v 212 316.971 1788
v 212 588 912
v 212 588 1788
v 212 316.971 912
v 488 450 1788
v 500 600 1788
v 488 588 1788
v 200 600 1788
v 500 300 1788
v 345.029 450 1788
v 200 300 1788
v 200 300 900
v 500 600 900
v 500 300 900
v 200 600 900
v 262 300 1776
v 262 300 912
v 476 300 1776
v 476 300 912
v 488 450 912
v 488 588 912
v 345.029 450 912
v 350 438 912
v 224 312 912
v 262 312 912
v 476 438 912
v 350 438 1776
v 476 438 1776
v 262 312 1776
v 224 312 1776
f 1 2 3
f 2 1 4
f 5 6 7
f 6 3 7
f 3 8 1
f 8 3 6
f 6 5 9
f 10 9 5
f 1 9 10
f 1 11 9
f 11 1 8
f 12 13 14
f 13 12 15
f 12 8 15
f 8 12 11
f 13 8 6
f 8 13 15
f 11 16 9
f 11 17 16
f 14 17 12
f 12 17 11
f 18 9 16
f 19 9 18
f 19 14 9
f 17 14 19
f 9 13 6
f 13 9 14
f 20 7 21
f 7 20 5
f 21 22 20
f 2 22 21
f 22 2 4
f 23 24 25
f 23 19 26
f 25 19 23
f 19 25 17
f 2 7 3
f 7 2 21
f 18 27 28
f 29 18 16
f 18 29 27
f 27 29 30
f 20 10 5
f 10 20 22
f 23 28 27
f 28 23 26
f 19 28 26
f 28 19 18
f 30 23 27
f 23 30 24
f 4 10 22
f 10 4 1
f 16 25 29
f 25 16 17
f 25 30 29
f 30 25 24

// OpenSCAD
// file: door.scad
/*

    Door
    
    By Anton Augustsson


*/

// use dovtail library

module door (
    thicknessBottom,
    thicknessSide,
    thicknessFront,
    lenghtDoor,
    widthDoor,
    heightDoor,
    xDoor,yDoor,zDoor,
    yRotate
    ){
/*
    ---------- Local varibles ---------- 
*/

length = lenghtDoor;
width  = widthDoor;
height = heightDoor;

widthHandal = 50;
        
x=xDoor;
y=yDoor;
z=zDoor;

/*
    ---------- Code ---------- 
*/

//rotate([0,0,0])  0,0,0
//rotate([0,180,0])  0,0,height
translate([
    x,
    y,
    z]) 
rotate([0,yRotate,0])
difference () {
union () {


// Bottom 
color("Wheat")
translate([
    0,
    0,
    0]) 
cube(size = [
    width,
    length,
    thicknessBottom]);


// top
color("Wheat")
translate([
    0,
    0,
    height-thicknessBottom]) 
cube(size = [
    width,
    length,
    thicknessBottom]);


// Back
color("BurlyWood")
translate([
    0,
    length-thicknessSide,
    0]) 
cube(size = [
    width,
    thicknessSide,
    height]);    


// Side not angle
color("Wheat")
translate([
    0,
    0,
    thicknessBottom]) 
cube(size = [
    thicknessSide,
    length,
    height-thicknessBottom*2]); //

// Side angle
color("Wheat")
translate([
    width,
    0,
    thicknessBottom]) 
rotate([0,0,45])
cube(size = [
    thicknessSide,
    sqrt(length*length*2),
    height-thicknessBottom*2]); //

// Back
color("BurlyWood")
translate([
    width-widthHandal,
    0,
    0]) 
cube(size = [
    widthHandal,
    thicknessSide,
    height]);    

}

// removal
union () {
translate([
    width+sqrt(thicknessSide*thicknessSide*2),
    0,
    -1]) 
rotate([0,0,45])
cube(size = [
    length*sin(45),
    sqrt(length*length*2),
    height+2]); //

translate([
    width,
    0,
    -1]) 
cube(size = [
    thicknessSide,
    length,
    height+2]); //

translate([
    0,
    length,
    0]) 
cube(size = [
    width,
    thicknessSide,
    height]);    
}

}}


    
/*
    ---------- Example ---------- 
*/


thicknessBottom = 14;
thicknessSide   = 14;
thicknessFront  = 20;

length = 100;
width  = 300;
height = 600;


x=0;
y=0;
z=0;
yRotate=0;

door (
    thicknessBottom,
    thicknessSide,
    thicknessFront,
    length,
    width,
    height,
    x,y,z,
    yRotate
    );
// file: cabinet.scad
/*

    Cabinet
    
    By Anton Augustsson


*/

module cabinet (
    thickness,
    length,
    width,
    height
    ){
/*
    ---------- Local varibles ---------- 
*/



/*
    ---------- Code ---------- 
*/


union () {

// Left
translate([
    0,
    0,
    0]) 
cube(size = [
    thickness,
    width,
    height-thickness]);

// Right
translate([
    length-thickness,
    0,
    0]) 
cube(size = [
    thickness,
    width,
    height-thickness]);
    
// Bottom 
translate([
    thickness,
    0,
    0]) 
cube(size = [
    length
    -thickness*2,
    width-thickness,
    thickness]);

// Back
translate([
    thickness,
    width-thickness,
    0]) 
cube(size = [
    length
    -thickness*2,
    thickness,
    height-thickness]);
}}



/*
    ---------- Example ---------- 
*/


thickness = 12;

length = 600;
width  = 600;
height = 900;

cabinet (
    thickness,
    length,
    width,
    height
    );
// main file
/*

    Second Section Left Cabinet
    
    By Anton Augustsson


*/

use <cabinet.scad>;
use <door.scad>;

module secondSectionLeftCabinet (
    plywoodThickness,
    lengthMiddleSection,
    lengthSecondSection,
    length,
    widthCabinet,
    widthCabinetDoor,
    widthTable,
    width,
    heightTable,
    heightCabinet,
    x,y,z
    ){

/*
    ---------- Local varibles ---------- 
*/

thickness = plywoodThickness;

length = lengthSecondSection;
width  = widthCabinet;
height = heightCabinet;


/*
    ---------- Code ---------- 
*/


translate([
	x,
	y,
	z,])

union () {

cabinet (
    thickness,
    length,
    width,
    height
    );

door (
    12,
    12,
    12,
    length/2,
    width-2*thickness,
    height-thickness,
    width-thickness,0,height-thickness,
    180
    );

}}



/*
    ---------- Example ---------- 
*/


plywoodThickness = 12;

lengthMiddleSection = 600;
lengthSecondSection = lengthMiddleSection/2;
lengthTirdSection   = 200;
length=lengthMiddleSection
    +lengthSecondSection*2
    +lengthTirdSection*2;

widthCabinet     = 300;
widthCabinetDoor = widthCabinet/3;
widthTable       = 300;
width            = widthCabinet+widthTable;

heightTable   = 900;
heightCabinet = 900;


x=lengthTirdSection;
y=width-widthCabinet;
z=heightTable;

secondSectionLeftCabinet (
    plywoodThickness,
    lengthMiddleSection,
    lengthSecondSection,
    length,
    widthCabinet,
    widthCabinetDoor,
    widthTable,
    width,
    heightTable,
    heightCabinet,
    x,y,z
    );
